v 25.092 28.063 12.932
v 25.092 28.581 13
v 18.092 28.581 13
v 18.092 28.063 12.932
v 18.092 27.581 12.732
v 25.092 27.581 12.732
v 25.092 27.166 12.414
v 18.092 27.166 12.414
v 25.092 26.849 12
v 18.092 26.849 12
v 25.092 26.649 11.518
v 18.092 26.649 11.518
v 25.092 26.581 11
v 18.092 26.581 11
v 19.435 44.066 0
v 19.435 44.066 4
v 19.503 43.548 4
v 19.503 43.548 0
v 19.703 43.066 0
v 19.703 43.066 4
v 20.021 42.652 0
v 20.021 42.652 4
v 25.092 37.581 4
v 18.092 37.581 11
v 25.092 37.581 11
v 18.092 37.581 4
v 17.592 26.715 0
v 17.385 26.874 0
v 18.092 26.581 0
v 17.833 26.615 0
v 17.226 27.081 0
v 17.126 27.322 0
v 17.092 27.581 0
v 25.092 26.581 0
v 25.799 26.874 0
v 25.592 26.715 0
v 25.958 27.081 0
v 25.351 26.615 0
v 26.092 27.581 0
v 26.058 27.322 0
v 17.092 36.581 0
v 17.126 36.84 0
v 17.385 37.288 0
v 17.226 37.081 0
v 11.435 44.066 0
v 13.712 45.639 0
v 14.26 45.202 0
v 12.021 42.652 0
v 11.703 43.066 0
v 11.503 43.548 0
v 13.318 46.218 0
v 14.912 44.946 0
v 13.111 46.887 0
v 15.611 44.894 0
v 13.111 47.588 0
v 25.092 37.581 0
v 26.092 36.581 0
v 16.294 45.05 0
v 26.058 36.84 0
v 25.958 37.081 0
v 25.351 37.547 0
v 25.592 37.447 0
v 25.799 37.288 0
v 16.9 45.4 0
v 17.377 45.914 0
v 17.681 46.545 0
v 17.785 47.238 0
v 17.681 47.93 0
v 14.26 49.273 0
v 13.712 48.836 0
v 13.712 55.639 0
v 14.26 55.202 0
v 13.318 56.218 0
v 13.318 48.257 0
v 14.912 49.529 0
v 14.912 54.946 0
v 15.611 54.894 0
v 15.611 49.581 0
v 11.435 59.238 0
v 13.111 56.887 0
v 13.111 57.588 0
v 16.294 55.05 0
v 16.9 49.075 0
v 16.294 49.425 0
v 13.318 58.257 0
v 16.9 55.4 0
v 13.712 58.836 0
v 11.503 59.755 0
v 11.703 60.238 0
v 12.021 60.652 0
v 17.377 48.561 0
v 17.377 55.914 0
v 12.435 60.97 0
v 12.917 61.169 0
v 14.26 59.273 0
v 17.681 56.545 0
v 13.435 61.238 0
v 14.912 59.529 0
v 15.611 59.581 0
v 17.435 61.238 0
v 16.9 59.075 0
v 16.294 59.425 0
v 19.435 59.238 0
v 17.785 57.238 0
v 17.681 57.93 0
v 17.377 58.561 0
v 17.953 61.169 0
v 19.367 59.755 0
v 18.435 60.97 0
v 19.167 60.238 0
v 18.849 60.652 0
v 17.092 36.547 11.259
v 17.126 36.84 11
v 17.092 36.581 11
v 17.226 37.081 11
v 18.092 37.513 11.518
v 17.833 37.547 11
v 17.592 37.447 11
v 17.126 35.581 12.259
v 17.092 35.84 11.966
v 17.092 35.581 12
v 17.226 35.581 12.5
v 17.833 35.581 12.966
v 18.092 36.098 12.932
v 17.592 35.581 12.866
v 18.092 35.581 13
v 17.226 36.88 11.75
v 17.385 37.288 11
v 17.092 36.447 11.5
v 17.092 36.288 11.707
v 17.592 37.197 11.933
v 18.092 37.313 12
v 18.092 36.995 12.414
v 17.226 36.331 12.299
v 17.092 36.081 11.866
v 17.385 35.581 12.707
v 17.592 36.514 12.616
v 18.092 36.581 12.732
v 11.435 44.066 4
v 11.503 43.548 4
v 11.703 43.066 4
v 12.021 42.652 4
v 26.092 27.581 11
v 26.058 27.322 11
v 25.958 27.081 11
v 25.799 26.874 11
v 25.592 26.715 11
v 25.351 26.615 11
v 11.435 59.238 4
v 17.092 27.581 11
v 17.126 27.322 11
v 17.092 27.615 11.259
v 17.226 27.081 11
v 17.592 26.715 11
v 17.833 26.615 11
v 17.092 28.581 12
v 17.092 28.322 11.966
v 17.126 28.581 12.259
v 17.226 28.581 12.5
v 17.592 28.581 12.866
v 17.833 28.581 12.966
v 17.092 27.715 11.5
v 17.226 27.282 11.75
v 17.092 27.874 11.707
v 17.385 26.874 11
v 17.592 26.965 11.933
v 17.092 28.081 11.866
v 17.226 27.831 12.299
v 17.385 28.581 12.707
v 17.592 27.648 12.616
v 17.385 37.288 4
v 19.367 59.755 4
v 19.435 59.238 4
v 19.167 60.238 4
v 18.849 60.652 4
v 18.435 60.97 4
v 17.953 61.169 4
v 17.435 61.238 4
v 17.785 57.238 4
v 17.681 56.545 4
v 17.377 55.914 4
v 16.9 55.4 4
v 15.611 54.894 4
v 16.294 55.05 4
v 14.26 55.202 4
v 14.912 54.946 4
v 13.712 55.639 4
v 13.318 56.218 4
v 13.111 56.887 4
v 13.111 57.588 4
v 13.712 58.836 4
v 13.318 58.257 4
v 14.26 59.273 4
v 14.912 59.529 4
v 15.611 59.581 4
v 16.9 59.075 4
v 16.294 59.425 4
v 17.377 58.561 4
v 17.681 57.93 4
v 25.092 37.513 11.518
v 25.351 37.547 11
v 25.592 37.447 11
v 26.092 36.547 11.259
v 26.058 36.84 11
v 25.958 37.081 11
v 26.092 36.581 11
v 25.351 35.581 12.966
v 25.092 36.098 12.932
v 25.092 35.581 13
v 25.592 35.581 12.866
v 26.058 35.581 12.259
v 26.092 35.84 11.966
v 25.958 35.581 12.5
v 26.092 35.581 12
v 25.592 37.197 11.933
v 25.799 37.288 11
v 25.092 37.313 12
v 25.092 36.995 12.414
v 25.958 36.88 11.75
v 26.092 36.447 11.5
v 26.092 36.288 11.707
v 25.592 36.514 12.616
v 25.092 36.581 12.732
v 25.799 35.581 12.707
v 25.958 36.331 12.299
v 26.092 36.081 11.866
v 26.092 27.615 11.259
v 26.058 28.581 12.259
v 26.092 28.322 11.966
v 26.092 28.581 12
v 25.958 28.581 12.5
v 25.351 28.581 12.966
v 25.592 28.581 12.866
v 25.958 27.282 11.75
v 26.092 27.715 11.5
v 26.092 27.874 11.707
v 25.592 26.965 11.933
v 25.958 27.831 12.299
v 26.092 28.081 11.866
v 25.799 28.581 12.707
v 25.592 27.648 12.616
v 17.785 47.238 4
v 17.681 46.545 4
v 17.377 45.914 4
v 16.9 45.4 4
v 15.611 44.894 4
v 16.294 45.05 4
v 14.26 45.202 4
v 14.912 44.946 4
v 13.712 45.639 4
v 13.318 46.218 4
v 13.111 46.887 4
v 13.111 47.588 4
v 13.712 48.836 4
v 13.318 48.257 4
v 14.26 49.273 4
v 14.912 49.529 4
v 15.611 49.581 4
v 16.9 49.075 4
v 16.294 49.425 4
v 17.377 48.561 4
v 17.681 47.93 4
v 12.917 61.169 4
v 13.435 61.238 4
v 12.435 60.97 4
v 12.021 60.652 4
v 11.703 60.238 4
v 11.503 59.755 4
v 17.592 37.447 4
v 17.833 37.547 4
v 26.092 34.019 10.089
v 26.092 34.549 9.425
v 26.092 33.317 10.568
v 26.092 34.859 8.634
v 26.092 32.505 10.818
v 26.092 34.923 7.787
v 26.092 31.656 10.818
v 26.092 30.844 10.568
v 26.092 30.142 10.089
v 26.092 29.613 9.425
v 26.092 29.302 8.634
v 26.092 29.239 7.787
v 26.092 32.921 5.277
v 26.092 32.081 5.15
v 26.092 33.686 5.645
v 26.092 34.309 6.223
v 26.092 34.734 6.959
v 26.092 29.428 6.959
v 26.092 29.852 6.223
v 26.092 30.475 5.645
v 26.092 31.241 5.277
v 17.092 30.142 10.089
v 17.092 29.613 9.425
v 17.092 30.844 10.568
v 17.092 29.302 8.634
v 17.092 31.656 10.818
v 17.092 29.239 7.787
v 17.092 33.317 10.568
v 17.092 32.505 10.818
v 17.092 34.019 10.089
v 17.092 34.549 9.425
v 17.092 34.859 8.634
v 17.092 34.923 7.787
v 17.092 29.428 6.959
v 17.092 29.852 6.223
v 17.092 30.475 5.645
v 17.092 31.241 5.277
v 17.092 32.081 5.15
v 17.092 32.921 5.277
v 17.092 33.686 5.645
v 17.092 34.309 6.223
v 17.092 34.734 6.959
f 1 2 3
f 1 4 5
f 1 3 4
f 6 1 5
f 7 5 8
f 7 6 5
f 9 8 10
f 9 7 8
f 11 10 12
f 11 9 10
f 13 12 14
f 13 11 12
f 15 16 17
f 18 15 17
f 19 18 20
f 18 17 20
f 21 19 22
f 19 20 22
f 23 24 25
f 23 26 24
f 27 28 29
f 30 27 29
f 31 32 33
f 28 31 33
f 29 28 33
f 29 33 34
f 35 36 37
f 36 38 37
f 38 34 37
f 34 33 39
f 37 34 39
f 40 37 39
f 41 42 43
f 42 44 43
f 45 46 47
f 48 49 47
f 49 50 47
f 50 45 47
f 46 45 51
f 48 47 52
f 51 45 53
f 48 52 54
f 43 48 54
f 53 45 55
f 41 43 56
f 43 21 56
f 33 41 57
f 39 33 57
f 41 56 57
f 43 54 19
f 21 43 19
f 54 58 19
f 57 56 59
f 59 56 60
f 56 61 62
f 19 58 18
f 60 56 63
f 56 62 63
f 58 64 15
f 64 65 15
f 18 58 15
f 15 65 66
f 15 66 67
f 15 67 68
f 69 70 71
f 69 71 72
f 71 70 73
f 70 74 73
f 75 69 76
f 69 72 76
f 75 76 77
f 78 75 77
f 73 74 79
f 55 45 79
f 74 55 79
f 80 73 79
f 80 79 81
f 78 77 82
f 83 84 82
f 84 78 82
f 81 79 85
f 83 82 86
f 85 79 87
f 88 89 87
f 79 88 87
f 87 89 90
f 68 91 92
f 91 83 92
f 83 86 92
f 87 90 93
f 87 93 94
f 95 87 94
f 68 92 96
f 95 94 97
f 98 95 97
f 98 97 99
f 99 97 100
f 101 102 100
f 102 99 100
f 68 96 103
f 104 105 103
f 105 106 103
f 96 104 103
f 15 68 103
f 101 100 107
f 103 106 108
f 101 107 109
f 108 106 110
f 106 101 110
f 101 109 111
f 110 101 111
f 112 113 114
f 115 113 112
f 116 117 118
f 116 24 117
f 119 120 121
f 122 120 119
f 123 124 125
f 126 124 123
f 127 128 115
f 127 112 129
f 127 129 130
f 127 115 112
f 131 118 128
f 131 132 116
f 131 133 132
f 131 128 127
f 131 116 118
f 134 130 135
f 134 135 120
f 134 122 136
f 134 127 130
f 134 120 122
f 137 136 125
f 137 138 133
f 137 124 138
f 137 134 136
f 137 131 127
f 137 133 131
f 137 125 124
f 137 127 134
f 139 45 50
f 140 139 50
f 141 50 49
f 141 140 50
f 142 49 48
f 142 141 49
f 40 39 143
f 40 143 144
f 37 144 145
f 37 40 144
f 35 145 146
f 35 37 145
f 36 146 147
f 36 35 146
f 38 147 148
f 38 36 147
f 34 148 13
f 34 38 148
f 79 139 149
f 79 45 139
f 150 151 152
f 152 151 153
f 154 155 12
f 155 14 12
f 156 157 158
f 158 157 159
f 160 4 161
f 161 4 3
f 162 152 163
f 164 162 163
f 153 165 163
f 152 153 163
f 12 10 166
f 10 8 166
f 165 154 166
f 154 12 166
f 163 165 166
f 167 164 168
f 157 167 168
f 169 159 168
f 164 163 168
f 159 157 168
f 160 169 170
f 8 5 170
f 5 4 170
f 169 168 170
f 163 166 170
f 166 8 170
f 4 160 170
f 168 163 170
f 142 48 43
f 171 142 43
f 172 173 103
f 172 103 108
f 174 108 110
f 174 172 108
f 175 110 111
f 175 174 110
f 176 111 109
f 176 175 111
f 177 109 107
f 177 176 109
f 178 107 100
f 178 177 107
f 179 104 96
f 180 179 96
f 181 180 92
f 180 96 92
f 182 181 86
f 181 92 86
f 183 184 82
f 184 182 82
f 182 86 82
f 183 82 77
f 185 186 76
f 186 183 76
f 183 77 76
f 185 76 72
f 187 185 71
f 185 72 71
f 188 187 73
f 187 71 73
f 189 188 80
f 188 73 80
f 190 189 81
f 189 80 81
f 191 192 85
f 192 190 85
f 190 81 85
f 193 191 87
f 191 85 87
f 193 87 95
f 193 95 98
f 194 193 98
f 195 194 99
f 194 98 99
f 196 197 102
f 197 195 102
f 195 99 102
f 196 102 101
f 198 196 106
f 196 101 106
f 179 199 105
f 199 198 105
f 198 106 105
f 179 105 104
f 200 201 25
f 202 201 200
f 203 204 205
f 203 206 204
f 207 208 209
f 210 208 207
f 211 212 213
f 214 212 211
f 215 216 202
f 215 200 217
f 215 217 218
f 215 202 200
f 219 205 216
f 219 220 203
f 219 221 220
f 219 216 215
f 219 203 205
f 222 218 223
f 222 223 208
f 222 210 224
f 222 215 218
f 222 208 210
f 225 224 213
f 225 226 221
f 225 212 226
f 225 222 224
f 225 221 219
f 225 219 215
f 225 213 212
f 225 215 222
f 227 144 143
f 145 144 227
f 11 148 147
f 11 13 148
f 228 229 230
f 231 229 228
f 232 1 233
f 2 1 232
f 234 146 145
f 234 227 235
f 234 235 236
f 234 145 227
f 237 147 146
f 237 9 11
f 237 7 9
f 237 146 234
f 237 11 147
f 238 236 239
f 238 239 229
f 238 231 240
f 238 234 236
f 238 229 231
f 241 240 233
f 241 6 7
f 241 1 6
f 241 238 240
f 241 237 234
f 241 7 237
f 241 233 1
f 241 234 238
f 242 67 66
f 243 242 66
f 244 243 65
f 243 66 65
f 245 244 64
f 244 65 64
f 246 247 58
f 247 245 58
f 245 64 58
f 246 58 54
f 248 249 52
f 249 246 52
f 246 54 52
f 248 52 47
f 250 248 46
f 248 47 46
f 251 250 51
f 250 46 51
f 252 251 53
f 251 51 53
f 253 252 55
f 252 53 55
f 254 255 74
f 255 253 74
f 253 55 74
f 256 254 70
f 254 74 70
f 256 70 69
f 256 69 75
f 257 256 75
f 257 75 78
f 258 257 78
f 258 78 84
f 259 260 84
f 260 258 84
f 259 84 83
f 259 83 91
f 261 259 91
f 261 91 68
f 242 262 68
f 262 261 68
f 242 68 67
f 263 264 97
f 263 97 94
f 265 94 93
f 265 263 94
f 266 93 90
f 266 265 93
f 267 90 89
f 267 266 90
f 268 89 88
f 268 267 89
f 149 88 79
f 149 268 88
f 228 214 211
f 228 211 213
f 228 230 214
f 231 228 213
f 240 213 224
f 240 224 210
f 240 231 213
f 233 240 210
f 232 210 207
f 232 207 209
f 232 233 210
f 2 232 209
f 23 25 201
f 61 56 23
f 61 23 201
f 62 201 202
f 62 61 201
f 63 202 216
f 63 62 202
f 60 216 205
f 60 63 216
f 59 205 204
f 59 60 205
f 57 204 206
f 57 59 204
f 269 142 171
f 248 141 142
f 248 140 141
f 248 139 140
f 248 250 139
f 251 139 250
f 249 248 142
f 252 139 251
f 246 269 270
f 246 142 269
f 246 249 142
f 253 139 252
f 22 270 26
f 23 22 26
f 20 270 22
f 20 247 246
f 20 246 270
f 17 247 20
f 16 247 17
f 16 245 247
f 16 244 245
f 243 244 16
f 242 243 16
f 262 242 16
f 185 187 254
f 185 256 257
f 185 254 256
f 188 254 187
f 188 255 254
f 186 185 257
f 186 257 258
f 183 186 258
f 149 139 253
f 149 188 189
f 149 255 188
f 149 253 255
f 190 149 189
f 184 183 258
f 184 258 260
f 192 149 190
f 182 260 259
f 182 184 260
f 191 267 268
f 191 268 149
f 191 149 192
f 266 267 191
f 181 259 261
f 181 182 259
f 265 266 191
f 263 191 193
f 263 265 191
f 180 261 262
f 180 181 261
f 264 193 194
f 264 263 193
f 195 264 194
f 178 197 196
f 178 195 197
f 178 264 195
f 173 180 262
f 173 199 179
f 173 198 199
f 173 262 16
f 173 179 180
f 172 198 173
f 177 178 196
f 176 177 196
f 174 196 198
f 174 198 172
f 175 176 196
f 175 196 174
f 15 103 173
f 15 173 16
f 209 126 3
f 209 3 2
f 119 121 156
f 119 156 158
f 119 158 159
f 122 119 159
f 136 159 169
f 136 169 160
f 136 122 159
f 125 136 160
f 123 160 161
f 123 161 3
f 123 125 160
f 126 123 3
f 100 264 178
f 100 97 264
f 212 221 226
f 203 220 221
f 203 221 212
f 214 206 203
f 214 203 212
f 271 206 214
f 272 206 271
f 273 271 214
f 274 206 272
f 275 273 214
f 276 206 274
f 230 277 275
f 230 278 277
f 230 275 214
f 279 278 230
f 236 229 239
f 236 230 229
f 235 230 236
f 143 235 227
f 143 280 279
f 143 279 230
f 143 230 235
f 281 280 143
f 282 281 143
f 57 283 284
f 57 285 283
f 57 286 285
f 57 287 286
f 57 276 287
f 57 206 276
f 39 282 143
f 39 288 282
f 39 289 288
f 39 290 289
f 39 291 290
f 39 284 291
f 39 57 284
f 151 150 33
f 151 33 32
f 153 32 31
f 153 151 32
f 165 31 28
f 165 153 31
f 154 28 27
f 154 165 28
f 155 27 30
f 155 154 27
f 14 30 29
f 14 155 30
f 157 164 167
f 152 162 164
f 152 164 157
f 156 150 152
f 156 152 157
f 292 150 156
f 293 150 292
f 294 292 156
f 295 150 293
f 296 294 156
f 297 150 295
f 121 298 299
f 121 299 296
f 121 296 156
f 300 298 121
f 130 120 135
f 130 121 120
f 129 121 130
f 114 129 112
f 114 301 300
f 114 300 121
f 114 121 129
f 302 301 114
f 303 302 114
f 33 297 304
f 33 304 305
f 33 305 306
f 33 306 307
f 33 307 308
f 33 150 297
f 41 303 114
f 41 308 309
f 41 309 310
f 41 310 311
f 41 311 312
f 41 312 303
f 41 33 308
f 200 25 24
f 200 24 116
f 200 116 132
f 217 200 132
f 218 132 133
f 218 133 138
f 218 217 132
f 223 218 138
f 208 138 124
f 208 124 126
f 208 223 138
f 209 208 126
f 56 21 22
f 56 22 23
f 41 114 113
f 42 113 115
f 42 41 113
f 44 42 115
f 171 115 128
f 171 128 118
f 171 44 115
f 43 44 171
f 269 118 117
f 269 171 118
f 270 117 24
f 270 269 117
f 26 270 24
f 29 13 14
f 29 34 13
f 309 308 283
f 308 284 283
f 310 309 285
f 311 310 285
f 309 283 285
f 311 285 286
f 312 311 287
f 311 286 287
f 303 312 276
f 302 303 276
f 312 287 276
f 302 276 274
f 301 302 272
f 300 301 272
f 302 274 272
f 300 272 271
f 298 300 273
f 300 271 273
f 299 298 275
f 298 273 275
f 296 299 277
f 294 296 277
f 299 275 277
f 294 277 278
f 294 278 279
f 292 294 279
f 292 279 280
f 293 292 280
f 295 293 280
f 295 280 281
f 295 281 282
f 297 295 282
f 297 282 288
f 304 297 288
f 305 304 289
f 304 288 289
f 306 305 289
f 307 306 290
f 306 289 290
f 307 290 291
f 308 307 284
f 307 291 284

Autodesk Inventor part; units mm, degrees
ref_plane "YZ Plane" through (0, 0, 0) normal (1, 0, 0) x (0, 1, 0)
ref_plane "XZ Plane" through (0, 0, 0) normal (0, 1, 0) x (-1, 0, 0)
ref_plane "XY Plane" through (0, 0, 0) normal (0, 0, 1) x (1, 0, 0)
ref_plane "Work Plane1" through (0, 0, 0) normal (0, 0, 1) x (1, 0, 0)
sketch "Sketch1" plane through (0, 0, 0) normal (0, 0, 1) x (1, 0, 0)
  circle A0 centre (-15.435, 47.2375) radius 1.95 projected
  circle A1 centre (-15.435, 57.2375) radius 1.95 projected
  circle A2 centre (15.435, 47.2375) radius 1.95 projected
  circle A3 centre (15.435, 57.2375) radius 1.95 projected
  circle A4 centre (0, -62.5) radius 13.5 projected
  circle A5 centre (0, -43.5) radius 2 projected
  circle A6 centre (-13.435, -49.065) radius 2 projected
  circle A7 centre (13.435, -49.065) radius 2 projected
  circle A8 centre (-13.435, -75.935) radius 2 projected
  arc A9 (-14.8492, -77.3492) -> (0, -83.5) centre (0, -62.5) ccw projected
  circle A10 centre (0, -81.5) radius 2 projected
  arc A11 (0, -83.5) -> (14.8492, -77.3492) centre (0, -62.5) ccw projected
  circle A12 centre (13.435, -75.935) radius 2 projected
  arc A13 (14.8492, -77.3492) -> (21, -62.5) centre (0, -62.5) ccw projected
  circle A14 centre (19, -62.5) radius 2 projected
  line L0 (21, 62.5) -> (21, -62.5) projected
  arc A15 (21, 62.5) -> (-21, 62.5) centre (0, 62.5) ccw projected
  line L1 (-21, -62.5) -> (-21, 62.5) projected
  circle A16 centre (-19, -62.5) radius 2 projected
  arc A17 (-21, -62.5) -> (-14.8492, -77.3492) centre (0, -62.5) ccw projected
  circle A18 centre (-15.5, -1.9727) radius 2.1 projected
  circle A19 centre (15.5, -1.9727) radius 2.1 projected
  circle A20 centre (-15.5, 29.0273) radius 2.1 projected
  circle A21 centre (15.5, 29.0273) radius 2.1 projected
  circle A22 centre (0, 13.5273) radius 13 projected
  line L2 (11.435, 61.2375) -> (19.435, 61.2375)
  line L3 (19.435, 61.2375) -> (19.435, 43.2375)
  line L4 (19.435, 43.2375) -> (11.435, 43.2375)
  line L5 (11.435, 43.2375) -> (11.435, 61.2375)
  circle A23 centre (15.435, 57.2375) radius 2.35
  circle A24 centre (15.435, 47.2375) radius 2.35
  line L6 (11.435, 43.2375) -> (17.0919, 37.5807)
  line L7 (11.435, 43.2375) -> (19.435, 43.2375) construction
  line L8 (19.435, 43.2375) -> (25.0919, 37.5807)
  line L9 (17.0919, 37.5807) -> (26.0919, 37.5807)
  line L10 (26.0919, 37.5807) -> (26.0919, 26.5807)
  line L11 (26.0919, 26.5807) -> (17.0919, 26.5807)
  line L12 (17.0919, 26.5807) -> (17.0919, 37.5807)
  point P0 (0, 0)
  dimension "d0" = 4
  dimension "d1" = 4
  dimension "d2" = 4
  dimension "d3" = 4
  dimension "d4" = 0.4
  dimension "d5" = 0.4
  dimension "d6" = 8
  dimension "d7" = 45
  dimension "d8" = 11
  dimension "d19" = 9
extrude "Extrusion1" add sketch "Sketch1" along normal blind 4 contours L11 L12 A21 L9 L0 | L0 L9 L10 L11 | L8 L9 L0 | L0 L9 L6 L4 L8 | L4 L5 L2 L3 | L12 A21 picked at (17.2417, 29.1915)
sketch "Sketch2" plane through (0, 0, 4) normal (0, 0, 1) x (1, 0, 0)
  line L0 (19.435, 61.2375) -> (11.435, 61.2375) projected
  line L1 (11.435, 61.2375) -> (11.435, 43.2375) projected
  line L2 (11.435, 43.2375) -> (17.0919, 37.5807) projected
  line L3 (17.0919, 37.5807) -> (17.0919, 26.5807) projected
  line L4 (17.0919, 26.5807) -> (26.0919, 26.5807) projected
  line L5 (26.0919, 26.5807) -> (26.0919, 37.5807) projected
  line L6 (25.0919, 37.5807) -> (19.435, 43.2375) projected
  line L7 (19.435, 43.2375) -> (19.435, 61.2375) projected
  circle A0 centre (15.435, 47.2375) radius 2.35 projected
  circle A1 centre (15.435, 57.2375) radius 2.35 projected
  line L8 (17.0919, 26.5807) -> (25.0919, 26.5807)
  line L9 (25.0919, 26.5807) -> (25.0919, 37.5807)
  line L10 (25.0919, 37.5807) -> (17.0919, 37.5807)
  line L11 (17.0919, 37.5807) -> (17.0919, 26.5807)
  line L12 (26.0919, 37.5807) -> (25.0919, 37.5807) projected
  point P0 (0, 0)
  point P1 (25.0919, 26.5807)
extrude "Extrusion2" add sketch "Sketch2" along normal blind 9 contours L12 L5 L4 L9 | L9 L4 L3 L10
sketch "Sketch3" plane through (26.0919, 26.5807, 0) normal (1, 0, 0) x (0, 0, -1)
  line L0 (0, 0) -> (0, 11) projected
  line L1 (-13, 0) -> (-13, 11) projected
  line L2 (0, 0) -> (-13, 0) projected
  circle A0 centre (-8, 5.5) radius 2.85
  line L3 (0, 11) -> (-13, 11) projected
  point P0 (0, -26.5807)
  dimension "d13" = 8
  dimension "d14" = 5.5
  dimension "d15" = 5.7
fillet "Fillet1" radius 2 4 edges at (11.435, 43.2375, 2) (11.435, 61.2375, 2) (19.435, 61.2375, 2) (19.435, 43.2375, 2)
extrude "Extrusion3" cut sketch "Sketch3" against normal through all contours A0
fillet "Fillet2" radius 2 2 edges at (21.5919, 37.5807, 13) (21.5919, 26.5807, 13)
fillet "Fillet3" radius 1 10 edges at (17.0919, 27.1665, 12.4142) (17.0919, 32.0807, 13) (17.0919, 36.9949, 12.4142) (17.0919, 37.5807, 7.5) (17.0919, 26.5807, 5.5) (26.0919, 27.1665, 12.4142) (26.0919, 32.0807, 13) (26.0919, 36.9949, 12.4142) (26.0919, 37.5807, 5.5) (26.0919, 26.5807, 5.5)
properties part number "top-tensioner_3DPrint"
